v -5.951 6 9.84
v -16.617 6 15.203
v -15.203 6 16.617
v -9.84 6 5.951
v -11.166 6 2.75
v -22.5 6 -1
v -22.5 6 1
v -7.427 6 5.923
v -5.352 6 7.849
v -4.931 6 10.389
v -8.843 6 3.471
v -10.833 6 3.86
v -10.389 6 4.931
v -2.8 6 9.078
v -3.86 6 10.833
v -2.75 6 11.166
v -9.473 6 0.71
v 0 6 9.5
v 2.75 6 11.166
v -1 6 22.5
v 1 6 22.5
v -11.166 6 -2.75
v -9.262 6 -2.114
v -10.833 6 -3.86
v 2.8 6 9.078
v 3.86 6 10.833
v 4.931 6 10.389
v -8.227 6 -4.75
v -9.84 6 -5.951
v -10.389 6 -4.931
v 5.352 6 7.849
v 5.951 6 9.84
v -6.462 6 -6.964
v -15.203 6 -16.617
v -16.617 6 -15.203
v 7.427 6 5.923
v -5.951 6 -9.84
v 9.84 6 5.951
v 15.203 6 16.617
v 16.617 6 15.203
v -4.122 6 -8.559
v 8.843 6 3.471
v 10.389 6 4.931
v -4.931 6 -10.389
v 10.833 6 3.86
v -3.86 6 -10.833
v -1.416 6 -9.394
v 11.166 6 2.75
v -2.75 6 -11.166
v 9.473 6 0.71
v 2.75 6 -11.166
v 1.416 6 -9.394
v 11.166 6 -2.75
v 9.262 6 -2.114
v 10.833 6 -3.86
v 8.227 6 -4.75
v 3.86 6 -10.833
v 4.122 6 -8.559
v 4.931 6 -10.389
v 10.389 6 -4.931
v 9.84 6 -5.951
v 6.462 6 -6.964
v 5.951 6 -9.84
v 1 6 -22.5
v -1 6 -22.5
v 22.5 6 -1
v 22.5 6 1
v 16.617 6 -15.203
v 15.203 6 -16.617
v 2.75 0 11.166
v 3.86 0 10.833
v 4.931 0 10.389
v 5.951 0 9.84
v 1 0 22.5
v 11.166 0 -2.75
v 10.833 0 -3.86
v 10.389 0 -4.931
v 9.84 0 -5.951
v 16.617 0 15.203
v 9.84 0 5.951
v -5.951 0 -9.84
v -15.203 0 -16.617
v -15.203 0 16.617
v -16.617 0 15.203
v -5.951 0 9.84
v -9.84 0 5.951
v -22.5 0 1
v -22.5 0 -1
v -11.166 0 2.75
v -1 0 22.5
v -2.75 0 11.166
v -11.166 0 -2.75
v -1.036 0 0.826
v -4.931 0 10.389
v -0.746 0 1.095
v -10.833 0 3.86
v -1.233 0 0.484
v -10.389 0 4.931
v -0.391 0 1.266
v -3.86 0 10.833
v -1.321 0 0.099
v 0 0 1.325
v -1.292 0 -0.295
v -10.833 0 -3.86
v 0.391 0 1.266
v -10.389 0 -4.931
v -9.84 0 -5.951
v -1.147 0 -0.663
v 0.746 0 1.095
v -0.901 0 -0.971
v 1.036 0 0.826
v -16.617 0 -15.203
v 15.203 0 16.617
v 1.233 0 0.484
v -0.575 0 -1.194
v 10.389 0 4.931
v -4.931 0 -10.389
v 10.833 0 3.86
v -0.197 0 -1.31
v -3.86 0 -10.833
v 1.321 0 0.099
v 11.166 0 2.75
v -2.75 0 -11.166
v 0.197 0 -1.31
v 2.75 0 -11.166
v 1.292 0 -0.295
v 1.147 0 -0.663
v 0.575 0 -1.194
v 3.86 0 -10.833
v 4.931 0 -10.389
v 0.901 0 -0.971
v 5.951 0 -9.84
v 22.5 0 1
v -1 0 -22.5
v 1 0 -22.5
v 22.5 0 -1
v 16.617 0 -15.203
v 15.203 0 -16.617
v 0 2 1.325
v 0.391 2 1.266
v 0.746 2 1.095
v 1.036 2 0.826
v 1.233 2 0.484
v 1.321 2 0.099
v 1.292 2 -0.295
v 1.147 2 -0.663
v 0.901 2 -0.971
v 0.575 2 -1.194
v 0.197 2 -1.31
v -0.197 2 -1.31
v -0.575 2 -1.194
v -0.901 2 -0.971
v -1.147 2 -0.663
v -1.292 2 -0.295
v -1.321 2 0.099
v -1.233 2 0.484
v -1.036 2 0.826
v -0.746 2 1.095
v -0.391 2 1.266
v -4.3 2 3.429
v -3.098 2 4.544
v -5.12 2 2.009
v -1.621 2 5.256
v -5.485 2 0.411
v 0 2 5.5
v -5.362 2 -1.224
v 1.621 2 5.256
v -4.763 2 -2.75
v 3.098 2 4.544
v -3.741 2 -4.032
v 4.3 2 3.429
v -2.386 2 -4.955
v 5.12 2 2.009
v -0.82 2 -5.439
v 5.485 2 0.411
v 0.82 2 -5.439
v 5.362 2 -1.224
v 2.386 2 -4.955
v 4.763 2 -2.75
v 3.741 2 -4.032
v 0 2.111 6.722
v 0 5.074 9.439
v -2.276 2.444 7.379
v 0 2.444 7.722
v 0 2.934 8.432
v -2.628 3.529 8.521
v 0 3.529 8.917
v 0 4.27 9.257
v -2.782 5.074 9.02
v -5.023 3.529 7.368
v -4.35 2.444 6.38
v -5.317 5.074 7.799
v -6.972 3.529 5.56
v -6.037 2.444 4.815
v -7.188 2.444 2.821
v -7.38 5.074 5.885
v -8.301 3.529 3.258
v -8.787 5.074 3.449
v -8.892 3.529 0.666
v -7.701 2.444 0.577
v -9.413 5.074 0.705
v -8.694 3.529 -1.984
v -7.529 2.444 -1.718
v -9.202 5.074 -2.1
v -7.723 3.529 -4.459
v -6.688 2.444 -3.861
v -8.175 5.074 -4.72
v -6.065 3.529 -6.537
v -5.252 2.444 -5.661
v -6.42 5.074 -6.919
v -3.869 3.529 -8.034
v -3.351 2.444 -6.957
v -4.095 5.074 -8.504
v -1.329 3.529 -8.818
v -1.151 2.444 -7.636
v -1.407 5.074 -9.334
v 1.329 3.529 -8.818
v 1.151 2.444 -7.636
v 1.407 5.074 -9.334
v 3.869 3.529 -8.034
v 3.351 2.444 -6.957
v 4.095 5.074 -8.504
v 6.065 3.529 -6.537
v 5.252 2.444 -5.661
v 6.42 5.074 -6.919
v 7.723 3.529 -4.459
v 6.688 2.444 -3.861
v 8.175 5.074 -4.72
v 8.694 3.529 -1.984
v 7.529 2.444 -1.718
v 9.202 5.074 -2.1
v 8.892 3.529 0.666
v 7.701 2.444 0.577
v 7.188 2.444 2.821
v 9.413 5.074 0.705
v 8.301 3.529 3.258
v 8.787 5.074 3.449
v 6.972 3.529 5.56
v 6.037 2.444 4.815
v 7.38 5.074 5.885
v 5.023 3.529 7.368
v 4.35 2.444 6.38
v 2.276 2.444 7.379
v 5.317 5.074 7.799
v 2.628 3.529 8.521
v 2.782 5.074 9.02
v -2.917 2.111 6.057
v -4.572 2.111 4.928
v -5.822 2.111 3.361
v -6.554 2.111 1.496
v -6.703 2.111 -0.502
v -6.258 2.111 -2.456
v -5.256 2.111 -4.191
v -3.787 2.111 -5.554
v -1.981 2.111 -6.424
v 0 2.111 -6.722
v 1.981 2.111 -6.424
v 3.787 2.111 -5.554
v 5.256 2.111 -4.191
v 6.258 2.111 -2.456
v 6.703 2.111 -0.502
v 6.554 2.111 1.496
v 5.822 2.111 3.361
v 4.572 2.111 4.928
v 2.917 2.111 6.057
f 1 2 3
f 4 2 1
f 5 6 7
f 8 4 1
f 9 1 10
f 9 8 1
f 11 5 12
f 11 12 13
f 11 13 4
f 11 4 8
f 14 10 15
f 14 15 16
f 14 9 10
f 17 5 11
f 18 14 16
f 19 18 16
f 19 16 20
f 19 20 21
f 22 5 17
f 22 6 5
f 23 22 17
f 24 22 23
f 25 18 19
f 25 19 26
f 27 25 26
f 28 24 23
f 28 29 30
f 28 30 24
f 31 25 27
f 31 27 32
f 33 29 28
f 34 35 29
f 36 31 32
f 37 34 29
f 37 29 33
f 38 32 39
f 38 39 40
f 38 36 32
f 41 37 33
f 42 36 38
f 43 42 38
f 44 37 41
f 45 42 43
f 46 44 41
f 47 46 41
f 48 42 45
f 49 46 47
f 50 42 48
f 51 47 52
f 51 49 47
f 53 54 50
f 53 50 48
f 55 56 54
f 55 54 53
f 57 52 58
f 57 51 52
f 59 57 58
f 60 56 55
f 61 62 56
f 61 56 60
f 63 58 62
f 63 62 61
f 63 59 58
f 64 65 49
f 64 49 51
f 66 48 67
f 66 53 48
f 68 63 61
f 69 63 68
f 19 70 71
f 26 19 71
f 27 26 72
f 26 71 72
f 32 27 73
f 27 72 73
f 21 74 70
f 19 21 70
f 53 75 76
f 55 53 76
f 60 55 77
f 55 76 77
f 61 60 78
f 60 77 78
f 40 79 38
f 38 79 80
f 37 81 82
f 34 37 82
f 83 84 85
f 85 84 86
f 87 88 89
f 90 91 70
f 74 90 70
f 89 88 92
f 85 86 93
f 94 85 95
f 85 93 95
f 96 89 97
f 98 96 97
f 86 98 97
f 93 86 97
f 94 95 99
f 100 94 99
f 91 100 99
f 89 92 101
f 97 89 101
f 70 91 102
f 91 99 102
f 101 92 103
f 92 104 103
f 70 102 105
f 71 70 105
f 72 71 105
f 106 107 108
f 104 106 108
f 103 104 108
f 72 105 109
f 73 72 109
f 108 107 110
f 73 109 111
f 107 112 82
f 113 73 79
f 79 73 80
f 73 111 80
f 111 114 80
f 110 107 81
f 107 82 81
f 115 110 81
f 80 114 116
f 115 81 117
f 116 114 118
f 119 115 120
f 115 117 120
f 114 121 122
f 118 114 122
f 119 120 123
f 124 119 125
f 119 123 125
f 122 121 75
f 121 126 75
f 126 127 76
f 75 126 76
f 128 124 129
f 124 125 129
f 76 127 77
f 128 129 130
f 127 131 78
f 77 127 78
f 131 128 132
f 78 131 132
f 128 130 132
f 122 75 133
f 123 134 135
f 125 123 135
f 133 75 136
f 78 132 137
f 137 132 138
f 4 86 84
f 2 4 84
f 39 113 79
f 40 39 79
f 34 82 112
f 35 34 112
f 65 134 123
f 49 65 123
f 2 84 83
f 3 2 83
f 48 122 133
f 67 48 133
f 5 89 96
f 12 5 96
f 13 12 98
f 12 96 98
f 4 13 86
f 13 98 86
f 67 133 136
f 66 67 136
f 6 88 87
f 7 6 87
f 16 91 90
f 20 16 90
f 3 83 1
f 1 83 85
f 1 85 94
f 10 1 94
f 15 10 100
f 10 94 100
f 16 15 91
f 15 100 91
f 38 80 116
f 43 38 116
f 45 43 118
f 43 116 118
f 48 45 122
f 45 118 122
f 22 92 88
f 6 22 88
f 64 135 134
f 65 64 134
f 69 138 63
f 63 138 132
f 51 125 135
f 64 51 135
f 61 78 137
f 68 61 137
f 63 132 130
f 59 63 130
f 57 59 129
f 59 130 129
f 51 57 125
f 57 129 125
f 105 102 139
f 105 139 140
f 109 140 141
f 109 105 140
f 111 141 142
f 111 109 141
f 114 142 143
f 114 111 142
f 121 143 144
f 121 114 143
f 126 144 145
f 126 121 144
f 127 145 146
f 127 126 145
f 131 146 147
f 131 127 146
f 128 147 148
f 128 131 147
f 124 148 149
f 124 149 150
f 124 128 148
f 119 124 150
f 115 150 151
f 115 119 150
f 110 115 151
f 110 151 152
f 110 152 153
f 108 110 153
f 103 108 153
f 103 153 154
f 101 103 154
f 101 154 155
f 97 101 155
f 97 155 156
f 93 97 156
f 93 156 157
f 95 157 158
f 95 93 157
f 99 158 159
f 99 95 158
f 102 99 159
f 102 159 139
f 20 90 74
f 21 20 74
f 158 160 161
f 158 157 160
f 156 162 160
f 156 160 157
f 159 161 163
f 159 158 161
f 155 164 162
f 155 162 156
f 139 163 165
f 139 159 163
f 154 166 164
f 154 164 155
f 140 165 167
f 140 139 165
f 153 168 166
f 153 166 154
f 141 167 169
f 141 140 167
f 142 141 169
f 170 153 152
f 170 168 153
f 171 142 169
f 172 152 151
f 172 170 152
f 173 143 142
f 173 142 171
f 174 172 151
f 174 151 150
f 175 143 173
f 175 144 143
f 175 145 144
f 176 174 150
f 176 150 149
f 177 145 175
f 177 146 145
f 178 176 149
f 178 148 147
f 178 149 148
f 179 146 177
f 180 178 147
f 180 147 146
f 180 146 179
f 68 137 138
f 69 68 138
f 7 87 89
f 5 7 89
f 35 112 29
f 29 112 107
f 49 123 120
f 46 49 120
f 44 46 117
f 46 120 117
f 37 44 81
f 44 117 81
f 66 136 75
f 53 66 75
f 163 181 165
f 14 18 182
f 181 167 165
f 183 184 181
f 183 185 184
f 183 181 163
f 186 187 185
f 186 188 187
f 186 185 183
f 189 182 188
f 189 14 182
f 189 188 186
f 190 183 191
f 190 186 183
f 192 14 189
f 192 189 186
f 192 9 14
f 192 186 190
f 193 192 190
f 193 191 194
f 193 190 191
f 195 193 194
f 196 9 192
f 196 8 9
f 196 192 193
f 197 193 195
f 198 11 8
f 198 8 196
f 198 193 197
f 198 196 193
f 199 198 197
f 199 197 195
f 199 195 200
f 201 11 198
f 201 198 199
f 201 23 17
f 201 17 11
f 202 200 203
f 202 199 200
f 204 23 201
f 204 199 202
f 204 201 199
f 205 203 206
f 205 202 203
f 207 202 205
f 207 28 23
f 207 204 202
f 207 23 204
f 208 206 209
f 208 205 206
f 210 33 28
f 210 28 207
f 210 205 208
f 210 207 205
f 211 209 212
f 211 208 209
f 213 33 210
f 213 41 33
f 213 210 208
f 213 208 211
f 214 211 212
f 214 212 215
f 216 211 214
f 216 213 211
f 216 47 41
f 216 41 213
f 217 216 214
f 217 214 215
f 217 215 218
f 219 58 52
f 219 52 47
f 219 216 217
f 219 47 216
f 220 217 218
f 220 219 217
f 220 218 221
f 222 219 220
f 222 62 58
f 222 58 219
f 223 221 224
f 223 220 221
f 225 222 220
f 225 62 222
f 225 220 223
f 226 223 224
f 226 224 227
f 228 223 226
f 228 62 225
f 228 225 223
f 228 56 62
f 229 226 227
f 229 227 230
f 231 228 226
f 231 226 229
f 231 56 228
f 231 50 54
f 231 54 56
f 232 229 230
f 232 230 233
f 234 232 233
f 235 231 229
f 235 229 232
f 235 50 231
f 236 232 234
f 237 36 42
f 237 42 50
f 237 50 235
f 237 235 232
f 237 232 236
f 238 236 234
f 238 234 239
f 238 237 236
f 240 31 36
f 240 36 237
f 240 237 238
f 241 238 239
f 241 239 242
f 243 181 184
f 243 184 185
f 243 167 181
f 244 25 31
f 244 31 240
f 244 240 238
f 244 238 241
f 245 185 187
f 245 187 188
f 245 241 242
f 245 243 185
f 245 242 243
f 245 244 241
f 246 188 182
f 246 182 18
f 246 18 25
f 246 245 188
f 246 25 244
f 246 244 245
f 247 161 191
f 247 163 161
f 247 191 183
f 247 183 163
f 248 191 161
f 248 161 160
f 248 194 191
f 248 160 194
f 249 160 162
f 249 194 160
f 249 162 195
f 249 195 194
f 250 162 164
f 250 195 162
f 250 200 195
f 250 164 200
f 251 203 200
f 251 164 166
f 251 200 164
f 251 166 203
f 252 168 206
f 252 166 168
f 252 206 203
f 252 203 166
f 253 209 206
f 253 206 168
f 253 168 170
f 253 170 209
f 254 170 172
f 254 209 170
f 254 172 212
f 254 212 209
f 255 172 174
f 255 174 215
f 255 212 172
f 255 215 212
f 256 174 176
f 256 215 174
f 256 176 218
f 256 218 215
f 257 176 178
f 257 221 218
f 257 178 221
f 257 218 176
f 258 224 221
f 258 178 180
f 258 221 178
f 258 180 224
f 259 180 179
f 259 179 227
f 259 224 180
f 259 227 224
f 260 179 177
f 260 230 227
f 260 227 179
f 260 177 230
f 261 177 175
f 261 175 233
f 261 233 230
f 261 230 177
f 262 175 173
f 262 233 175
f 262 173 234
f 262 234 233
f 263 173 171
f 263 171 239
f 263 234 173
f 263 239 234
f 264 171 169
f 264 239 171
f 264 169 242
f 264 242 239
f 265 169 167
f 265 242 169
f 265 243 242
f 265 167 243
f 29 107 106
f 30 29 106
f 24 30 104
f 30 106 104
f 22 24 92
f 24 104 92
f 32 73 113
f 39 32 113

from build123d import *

# Parameters (mm, degrees)
SKETCH1_R           = 11.5
SKETCH1_R_2         = 9.5
BOSS_EXTRUDE2_DEPTH = 6
SKETCH1_6_R         = 11.5
SKETCH1_6_R_2       = 1.325
BOSS_EXTRUDE3_DEPTH = 2
FILLET4_SIZE        = 4


with BuildPart() as part:
    # Sketch1 → Boss-Extrude2 (new body)
    # profile 1 of 9: a face of its own
    with BuildSketch(Plane(origin=(0, 0, 0), x_dir=(1, 0, 0), z_dir=(0, 1, 0))):
        with BuildLine():
            ThreePointArc((-11.166355717, -2.75), (-11.5, 0), (-11.166355717, 2.75))
            Line((-11.166355717, 2.75), (-22.5, 1))
            Line((-22.5, 1), (-22.5, -1))
            Line((-22.5, -1), (-11.166355717, -2.75))
        make_face()
    # profile 2 of 9: a face of its own
    with BuildSketch(Plane(origin=(0, 0, 0), x_dir=(1, 0, 0), z_dir=(0, 1, 0))):
        with BuildLine():
            Line((-15.202795796, -16.617009358), (-5.9512622, -9.840349497))
            ThreePointArc((-5.9512622, -9.840349497), (-8.131727984, -8.131727984), (-9.840349497, -5.9512622))
            Line((-9.840349497, -5.9512622), (-16.617009358, -15.202795796))
            Line((-16.617009358, -15.202795796), (-15.202795796, -16.617009358))
        make_face()
    # profile 3 of 9: a face of its own
    with BuildSketch(Plane(origin=(0, 0, 0), x_dir=(1, 0, 0), z_dir=(0, 1, 0))):
        with BuildLine():
            ThreePointArc((-9.840349497, 5.9512622), (-8.131727984, 8.131727984), (-5.9512622, 9.840349497))
            Line((-5.9512622, 9.840349497), (-15.202795796, 16.617009358))
            Line((-15.202795796, 16.617009358), (-16.617009358, 15.202795796))
            Line((-16.617009358, 15.202795796), (-9.840349497, 5.9512622))
        make_face()
    # profile 4 of 9: a face of its own
    with BuildSketch(Plane(origin=(0, 0, 0), x_dir=(1, 0, 0), z_dir=(0, 1, 0))):
        with BuildLine():
            ThreePointArc((-2.75, 11.166355717), (0, 11.5), (2.75, 11.166355717))
            Line((2.75, 11.166355717), (1, 22.5))
            Line((1, 22.5), (-1, 22.5))
            Line((-1, 22.5), (-2.75, 11.166355717))
        make_face()
    # profile 5 of 9: a face of its own
    with BuildSketch(Plane(origin=(0, 0, 0), x_dir=(1, 0, 0), z_dir=(0, 1, 0))):
        with BuildLine():
            ThreePointArc((5.9512622, 9.840349497), (8.131727984, 8.131727984), (9.840349497, 5.9512622))
            Line((9.840349497, 5.9512622), (16.617009358, 15.202795796))
            Line((16.617009358, 15.202795796), (15.202795796, 16.617009358))
            Line((15.202795796, 16.617009358), (5.9512622, 9.840349497))
        make_face()
    # profile 6 of 9: a face of its own
    with BuildSketch(Plane(origin=(0, 0, 0), x_dir=(1, 0, 0), z_dir=(0, 1, 0))):
        with BuildLine():
            Line((22.5, 1), (11.166355717, 2.75))
            ThreePointArc((11.166355717, 2.75), (11.416284219, 1.385082895), (11.5, 0))
            ThreePointArc((11.5, 0), (11.416284219, -1.385082895), (11.166355717, -2.75))
            Line((11.166355717, -2.75), (22.5, -1))
            Line((22.5, -1), (22.5, 1))
        make_face()
    # profile 7 of 9: a face of its own
    with BuildSketch(Plane(origin=(0, 0, 0), x_dir=(1, 0, 0), z_dir=(0, 1, 0))):
        with BuildLine():
            Line((1, -22.5), (2.75, -11.166355717))
            ThreePointArc((2.75, -11.166355717), (0, -11.5), (-2.75, -11.166355717))
            Line((-2.75, -11.166355717), (-1, -22.5))
            Line((-1, -22.5), (1, -22.5))
        make_face()
    # profile 8 of 9: a face of its own
    with BuildSketch(Plane(origin=(0, 0, 0), x_dir=(1, 0, 0), z_dir=(0, 1, 0))):
        with BuildLine():
            Line((16.617009358, -15.202795796), (9.840349497, -5.9512622))
            ThreePointArc((9.840349497, -5.9512622), (8.131727984, -8.131727984), (5.9512622, -9.840349497))
            Line((5.9512622, -9.840349497), (15.202795796, -16.617009358))
            Line((15.202795796, -16.617009358), (16.617009358, -15.202795796))
        make_face()
    # profile 9 of 9: a face of its own
    with BuildSketch(Plane(origin=(0, 0, 0), x_dir=(1, 0, 0), z_dir=(0, 1, 0))):
        Circle(SKETCH1_R)
        with Locations(Location((0, 0, 0), (0, 0, 270))):
            Circle(SKETCH1_R_2, mode=Mode.SUBTRACT)
    extrude(amount=BOSS_EXTRUDE2_DEPTH)

    # Sketch1<6> → Boss-Extrude3 (add)
    with BuildSketch(Plane(origin=(0, 0, 0), x_dir=(1, 0, 0), z_dir=(0, 1, 0))):
        Circle(SKETCH1_6_R)
        with Locations(Location((0, 0, 0), (0, 0, 270))):
            Circle(SKETCH1_6_R_2, mode=Mode.SUBTRACT)
    extrude(amount=BOSS_EXTRUDE3_DEPTH)

    # Fillet4
    # a fillet whose section is not a circle: 4 mm, written as the material it adds along each edge
    with BuildSketch(Plane(origin=(0, 2, 0), x_dir=(0, 0, 1), z_dir=(1, 0, 0))) as fillet4_piece_1:
        with BuildLine():
            Bezier((9.5 - FILLET4_SIZE, 0), (9.5, 0), (9.5, -FILLET4_SIZE), weights=[1, 1, 1])
            Line((9.5, -FILLET4_SIZE), (9.5, 0))
            Line((9.5, 0), (9.5 - FILLET4_SIZE, 0))
        make_face()
    revolve(axis=Axis((0, 2, 0), (0, -1, 0)))


solid = part.part
